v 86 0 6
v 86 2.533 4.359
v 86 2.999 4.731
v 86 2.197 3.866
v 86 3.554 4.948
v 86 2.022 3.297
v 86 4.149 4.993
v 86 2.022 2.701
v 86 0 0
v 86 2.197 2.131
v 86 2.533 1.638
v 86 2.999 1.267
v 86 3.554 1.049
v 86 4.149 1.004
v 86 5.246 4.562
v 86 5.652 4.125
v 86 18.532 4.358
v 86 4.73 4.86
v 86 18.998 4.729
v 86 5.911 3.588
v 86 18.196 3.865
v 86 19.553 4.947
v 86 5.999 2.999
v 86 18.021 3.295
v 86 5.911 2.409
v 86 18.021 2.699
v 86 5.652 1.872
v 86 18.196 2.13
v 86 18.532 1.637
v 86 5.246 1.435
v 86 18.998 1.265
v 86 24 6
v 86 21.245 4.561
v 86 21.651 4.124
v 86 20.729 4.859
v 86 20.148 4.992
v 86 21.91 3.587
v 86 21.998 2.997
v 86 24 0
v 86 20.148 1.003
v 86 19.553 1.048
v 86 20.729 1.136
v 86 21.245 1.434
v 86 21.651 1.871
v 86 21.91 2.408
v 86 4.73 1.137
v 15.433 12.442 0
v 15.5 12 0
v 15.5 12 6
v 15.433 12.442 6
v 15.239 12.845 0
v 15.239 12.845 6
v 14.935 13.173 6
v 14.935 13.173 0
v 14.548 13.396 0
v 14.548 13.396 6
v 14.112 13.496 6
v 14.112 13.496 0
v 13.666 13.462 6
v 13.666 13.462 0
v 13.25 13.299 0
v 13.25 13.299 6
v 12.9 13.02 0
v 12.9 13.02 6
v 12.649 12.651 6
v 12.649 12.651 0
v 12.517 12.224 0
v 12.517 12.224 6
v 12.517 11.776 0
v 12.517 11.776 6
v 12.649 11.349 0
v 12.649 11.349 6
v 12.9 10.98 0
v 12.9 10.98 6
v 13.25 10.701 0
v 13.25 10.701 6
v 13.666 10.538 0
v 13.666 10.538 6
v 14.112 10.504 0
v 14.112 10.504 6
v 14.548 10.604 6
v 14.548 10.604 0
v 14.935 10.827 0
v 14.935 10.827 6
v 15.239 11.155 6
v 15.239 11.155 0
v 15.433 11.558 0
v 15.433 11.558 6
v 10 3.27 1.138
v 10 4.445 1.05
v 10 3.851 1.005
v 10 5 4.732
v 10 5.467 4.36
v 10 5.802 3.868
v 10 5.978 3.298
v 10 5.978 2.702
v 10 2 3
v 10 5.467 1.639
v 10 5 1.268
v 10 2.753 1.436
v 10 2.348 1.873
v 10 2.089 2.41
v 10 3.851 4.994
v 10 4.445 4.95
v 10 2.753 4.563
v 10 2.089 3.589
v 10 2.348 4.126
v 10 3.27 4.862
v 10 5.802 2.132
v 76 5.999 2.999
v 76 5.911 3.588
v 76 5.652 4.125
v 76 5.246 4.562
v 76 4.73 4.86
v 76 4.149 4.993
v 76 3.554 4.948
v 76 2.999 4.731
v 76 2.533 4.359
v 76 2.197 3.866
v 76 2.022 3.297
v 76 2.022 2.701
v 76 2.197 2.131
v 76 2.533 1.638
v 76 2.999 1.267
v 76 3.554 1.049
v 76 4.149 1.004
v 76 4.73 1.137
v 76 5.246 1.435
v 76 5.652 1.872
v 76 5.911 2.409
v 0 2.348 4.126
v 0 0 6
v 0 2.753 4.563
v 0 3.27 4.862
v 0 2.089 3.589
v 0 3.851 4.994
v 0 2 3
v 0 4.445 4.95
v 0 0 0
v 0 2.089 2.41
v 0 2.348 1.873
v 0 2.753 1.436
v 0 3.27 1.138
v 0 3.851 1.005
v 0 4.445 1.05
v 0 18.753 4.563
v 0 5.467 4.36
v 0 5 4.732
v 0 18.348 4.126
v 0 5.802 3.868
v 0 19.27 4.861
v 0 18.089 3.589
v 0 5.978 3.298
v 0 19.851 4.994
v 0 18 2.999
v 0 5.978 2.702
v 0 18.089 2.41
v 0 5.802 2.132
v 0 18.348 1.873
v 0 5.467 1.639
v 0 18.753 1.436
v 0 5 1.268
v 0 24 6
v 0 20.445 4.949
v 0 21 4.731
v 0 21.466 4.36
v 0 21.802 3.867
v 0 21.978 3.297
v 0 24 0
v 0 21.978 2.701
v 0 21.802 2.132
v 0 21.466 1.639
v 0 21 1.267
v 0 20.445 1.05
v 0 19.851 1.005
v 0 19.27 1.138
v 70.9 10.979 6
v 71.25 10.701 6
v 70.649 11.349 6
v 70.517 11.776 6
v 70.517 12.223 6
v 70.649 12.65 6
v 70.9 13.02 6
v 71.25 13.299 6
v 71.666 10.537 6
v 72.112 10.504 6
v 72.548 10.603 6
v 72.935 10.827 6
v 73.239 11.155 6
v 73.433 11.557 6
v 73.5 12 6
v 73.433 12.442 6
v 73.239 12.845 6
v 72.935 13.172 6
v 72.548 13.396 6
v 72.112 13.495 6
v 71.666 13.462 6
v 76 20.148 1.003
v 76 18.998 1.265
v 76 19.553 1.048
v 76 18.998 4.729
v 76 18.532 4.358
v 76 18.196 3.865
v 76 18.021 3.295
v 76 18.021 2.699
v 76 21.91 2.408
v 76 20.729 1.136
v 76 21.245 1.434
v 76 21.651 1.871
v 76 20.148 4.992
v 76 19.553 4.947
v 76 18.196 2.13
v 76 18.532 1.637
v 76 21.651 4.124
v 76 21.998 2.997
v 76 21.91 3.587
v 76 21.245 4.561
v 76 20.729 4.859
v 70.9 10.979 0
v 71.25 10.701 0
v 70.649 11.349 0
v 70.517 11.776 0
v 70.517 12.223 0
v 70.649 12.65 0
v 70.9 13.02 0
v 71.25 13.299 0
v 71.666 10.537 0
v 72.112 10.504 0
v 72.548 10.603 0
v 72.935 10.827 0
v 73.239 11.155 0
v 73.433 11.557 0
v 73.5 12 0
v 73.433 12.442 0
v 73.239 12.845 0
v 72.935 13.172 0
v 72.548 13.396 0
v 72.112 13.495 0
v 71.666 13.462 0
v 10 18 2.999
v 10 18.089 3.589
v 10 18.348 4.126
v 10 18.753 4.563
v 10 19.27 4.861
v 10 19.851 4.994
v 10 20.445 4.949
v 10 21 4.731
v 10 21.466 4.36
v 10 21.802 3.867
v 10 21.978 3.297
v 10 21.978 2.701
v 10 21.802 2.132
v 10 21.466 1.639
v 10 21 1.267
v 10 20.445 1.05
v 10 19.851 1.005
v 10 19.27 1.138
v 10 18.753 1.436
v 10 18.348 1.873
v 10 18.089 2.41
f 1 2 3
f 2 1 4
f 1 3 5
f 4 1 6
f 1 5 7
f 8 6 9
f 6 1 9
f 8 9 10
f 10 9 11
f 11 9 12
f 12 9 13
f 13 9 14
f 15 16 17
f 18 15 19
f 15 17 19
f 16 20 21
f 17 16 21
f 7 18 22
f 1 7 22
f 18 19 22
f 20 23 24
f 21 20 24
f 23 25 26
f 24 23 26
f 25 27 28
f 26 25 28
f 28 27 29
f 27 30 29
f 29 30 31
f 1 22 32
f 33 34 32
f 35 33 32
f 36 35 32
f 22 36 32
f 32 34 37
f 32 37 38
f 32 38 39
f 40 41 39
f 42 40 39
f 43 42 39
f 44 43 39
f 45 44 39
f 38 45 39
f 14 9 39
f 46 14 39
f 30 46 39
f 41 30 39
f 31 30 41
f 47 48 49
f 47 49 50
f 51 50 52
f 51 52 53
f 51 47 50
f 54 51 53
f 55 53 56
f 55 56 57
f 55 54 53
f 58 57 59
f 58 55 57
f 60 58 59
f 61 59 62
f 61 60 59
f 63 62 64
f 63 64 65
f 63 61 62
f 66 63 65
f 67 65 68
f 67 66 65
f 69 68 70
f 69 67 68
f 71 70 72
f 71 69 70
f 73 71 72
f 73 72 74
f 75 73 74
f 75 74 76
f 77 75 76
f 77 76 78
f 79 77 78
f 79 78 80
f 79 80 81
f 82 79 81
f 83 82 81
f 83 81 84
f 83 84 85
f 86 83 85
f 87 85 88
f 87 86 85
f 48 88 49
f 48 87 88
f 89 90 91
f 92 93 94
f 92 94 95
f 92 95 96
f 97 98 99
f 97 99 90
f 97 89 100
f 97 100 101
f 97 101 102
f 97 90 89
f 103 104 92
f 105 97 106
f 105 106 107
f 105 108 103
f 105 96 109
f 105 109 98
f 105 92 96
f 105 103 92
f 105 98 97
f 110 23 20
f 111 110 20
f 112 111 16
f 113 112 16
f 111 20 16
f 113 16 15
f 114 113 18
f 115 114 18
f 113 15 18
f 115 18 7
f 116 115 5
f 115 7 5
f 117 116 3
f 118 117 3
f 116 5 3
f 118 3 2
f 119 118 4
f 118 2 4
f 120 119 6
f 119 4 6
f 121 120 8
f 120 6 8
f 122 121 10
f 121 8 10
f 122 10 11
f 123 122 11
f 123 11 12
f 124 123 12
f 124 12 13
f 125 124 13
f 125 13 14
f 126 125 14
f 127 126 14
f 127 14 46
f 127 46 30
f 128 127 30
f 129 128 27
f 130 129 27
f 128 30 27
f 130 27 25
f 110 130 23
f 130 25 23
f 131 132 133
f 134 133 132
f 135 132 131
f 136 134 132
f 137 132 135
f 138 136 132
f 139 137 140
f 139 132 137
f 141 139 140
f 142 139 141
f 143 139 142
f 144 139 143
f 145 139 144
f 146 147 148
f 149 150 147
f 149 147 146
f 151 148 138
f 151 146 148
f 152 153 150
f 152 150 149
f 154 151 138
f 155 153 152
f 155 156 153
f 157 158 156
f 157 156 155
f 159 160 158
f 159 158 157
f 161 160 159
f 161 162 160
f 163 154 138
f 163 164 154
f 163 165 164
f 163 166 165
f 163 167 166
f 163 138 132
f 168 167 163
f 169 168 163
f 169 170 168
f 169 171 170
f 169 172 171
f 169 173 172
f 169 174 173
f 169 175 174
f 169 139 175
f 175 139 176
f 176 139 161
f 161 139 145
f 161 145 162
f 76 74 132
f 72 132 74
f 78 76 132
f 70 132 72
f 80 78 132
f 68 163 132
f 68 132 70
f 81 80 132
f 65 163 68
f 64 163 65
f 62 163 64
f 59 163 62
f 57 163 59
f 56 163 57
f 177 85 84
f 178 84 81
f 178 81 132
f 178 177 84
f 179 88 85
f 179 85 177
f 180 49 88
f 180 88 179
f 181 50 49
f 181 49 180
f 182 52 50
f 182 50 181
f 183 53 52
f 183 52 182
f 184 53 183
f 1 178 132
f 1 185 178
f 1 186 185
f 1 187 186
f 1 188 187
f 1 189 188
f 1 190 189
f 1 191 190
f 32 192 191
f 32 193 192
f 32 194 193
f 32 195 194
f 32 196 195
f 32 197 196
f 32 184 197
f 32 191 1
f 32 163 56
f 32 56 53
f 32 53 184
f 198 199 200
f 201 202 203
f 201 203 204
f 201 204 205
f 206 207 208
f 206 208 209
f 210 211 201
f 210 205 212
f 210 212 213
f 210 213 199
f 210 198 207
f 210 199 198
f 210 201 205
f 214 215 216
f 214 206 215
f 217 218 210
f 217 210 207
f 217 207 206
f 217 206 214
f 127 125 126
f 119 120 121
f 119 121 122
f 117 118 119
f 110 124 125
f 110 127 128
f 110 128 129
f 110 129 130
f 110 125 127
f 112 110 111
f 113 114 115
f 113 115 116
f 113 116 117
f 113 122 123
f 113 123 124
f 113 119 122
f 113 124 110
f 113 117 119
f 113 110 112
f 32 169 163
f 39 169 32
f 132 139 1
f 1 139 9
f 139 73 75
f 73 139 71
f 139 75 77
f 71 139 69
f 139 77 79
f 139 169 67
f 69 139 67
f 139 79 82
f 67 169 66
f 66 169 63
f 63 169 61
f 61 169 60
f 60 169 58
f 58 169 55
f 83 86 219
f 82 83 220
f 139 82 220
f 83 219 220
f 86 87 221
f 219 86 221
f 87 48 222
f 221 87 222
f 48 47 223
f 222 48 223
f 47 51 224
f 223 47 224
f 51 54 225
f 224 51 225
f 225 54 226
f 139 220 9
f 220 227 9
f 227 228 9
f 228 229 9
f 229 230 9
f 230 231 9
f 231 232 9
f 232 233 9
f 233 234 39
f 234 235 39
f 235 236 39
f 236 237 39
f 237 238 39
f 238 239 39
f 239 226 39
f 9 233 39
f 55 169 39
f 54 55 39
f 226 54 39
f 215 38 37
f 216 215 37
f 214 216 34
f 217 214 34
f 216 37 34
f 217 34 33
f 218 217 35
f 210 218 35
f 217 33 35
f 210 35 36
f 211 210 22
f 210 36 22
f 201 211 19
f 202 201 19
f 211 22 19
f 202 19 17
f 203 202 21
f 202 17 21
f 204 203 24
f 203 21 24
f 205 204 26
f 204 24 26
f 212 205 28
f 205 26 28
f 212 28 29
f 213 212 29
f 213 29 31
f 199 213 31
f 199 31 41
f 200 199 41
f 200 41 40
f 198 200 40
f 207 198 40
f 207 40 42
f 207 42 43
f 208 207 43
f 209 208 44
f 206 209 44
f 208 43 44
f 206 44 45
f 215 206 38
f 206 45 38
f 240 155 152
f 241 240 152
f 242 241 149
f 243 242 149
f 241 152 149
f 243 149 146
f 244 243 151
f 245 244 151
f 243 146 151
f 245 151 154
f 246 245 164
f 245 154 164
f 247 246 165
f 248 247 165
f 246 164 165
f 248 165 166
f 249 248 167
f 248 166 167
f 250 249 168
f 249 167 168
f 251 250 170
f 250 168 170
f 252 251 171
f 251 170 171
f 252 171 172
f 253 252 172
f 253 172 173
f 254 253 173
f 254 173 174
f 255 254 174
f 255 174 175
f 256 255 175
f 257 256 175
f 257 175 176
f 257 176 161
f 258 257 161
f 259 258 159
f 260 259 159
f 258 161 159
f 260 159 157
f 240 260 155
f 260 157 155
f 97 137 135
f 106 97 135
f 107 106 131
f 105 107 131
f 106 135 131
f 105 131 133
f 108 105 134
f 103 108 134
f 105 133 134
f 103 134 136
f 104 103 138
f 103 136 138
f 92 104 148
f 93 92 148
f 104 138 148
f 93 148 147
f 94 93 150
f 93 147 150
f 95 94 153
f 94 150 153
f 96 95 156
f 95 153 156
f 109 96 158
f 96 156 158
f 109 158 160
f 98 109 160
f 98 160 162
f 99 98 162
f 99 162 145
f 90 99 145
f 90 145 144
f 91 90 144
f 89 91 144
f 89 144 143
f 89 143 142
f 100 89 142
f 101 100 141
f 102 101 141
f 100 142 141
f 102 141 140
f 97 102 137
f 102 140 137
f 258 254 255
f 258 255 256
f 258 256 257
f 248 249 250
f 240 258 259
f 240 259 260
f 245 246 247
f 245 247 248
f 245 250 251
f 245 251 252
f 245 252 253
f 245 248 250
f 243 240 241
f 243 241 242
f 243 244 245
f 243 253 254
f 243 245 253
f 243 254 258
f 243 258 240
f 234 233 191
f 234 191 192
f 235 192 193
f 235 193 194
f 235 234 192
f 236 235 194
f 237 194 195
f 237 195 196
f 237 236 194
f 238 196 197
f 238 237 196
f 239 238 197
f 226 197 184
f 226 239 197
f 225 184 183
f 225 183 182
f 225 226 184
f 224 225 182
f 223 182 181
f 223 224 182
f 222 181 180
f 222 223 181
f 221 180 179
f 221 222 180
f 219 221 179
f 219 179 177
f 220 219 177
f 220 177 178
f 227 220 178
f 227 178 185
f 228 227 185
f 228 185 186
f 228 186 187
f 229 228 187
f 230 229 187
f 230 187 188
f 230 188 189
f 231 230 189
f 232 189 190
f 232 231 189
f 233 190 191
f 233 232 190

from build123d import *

# Parameters (mm, degrees)
SKETCH_W        = 86
SKETCH_H        = 24
SKETCH_R        = 1.5
PAD_DEPTH       = 6
SKETCH002_R     = 2
POCKET_DEPTH    = 10
SKETCH003_R     = 2
POCKET001_DEPTH = 10


with BuildPart() as part:
    # Sketch → Pad (new body)
    with BuildSketch(Plane.XY):
        with Locations((43, 12)):
            Rectangle(SKETCH_W, SKETCH_H)
        with Locations((13.999996, 11.999945)):
            Circle(SKETCH_R, mode=Mode.SUBTRACT)
        with Locations((71.999985, 11.999591)):
            Circle(SKETCH_R, mode=Mode.SUBTRACT)
    extrude(amount=PAD_DEPTH)

    # Sketch002 (on Face2 of Pad) → Pocket (cut)
    with BuildSketch(Plane.YZ.offset(86)):
        with Locations((3.999421, 2.998608)):
            Circle(SKETCH002_R)
        with Locations((19.998423, 2.997373)):
            Circle(SKETCH002_R)
    extrude(amount=-POCKET_DEPTH, mode=Mode.SUBTRACT)

    # Sketch003 (on Face2 of Pocket) → Pocket001 (cut)
    with BuildSketch(Plane(origin=(0, 0, 0), x_dir=(0, -1, 0), z_dir=(-1, 0, 0))):
        with Locations((-4.000442, 2.999754)):
            Circle(SKETCH003_R)
        with Locations((-20.000246, 2.999371)):
            Circle(SKETCH003_R)
    extrude(amount=-POCKET001_DEPTH, mode=Mode.SUBTRACT)


solid = part.part
